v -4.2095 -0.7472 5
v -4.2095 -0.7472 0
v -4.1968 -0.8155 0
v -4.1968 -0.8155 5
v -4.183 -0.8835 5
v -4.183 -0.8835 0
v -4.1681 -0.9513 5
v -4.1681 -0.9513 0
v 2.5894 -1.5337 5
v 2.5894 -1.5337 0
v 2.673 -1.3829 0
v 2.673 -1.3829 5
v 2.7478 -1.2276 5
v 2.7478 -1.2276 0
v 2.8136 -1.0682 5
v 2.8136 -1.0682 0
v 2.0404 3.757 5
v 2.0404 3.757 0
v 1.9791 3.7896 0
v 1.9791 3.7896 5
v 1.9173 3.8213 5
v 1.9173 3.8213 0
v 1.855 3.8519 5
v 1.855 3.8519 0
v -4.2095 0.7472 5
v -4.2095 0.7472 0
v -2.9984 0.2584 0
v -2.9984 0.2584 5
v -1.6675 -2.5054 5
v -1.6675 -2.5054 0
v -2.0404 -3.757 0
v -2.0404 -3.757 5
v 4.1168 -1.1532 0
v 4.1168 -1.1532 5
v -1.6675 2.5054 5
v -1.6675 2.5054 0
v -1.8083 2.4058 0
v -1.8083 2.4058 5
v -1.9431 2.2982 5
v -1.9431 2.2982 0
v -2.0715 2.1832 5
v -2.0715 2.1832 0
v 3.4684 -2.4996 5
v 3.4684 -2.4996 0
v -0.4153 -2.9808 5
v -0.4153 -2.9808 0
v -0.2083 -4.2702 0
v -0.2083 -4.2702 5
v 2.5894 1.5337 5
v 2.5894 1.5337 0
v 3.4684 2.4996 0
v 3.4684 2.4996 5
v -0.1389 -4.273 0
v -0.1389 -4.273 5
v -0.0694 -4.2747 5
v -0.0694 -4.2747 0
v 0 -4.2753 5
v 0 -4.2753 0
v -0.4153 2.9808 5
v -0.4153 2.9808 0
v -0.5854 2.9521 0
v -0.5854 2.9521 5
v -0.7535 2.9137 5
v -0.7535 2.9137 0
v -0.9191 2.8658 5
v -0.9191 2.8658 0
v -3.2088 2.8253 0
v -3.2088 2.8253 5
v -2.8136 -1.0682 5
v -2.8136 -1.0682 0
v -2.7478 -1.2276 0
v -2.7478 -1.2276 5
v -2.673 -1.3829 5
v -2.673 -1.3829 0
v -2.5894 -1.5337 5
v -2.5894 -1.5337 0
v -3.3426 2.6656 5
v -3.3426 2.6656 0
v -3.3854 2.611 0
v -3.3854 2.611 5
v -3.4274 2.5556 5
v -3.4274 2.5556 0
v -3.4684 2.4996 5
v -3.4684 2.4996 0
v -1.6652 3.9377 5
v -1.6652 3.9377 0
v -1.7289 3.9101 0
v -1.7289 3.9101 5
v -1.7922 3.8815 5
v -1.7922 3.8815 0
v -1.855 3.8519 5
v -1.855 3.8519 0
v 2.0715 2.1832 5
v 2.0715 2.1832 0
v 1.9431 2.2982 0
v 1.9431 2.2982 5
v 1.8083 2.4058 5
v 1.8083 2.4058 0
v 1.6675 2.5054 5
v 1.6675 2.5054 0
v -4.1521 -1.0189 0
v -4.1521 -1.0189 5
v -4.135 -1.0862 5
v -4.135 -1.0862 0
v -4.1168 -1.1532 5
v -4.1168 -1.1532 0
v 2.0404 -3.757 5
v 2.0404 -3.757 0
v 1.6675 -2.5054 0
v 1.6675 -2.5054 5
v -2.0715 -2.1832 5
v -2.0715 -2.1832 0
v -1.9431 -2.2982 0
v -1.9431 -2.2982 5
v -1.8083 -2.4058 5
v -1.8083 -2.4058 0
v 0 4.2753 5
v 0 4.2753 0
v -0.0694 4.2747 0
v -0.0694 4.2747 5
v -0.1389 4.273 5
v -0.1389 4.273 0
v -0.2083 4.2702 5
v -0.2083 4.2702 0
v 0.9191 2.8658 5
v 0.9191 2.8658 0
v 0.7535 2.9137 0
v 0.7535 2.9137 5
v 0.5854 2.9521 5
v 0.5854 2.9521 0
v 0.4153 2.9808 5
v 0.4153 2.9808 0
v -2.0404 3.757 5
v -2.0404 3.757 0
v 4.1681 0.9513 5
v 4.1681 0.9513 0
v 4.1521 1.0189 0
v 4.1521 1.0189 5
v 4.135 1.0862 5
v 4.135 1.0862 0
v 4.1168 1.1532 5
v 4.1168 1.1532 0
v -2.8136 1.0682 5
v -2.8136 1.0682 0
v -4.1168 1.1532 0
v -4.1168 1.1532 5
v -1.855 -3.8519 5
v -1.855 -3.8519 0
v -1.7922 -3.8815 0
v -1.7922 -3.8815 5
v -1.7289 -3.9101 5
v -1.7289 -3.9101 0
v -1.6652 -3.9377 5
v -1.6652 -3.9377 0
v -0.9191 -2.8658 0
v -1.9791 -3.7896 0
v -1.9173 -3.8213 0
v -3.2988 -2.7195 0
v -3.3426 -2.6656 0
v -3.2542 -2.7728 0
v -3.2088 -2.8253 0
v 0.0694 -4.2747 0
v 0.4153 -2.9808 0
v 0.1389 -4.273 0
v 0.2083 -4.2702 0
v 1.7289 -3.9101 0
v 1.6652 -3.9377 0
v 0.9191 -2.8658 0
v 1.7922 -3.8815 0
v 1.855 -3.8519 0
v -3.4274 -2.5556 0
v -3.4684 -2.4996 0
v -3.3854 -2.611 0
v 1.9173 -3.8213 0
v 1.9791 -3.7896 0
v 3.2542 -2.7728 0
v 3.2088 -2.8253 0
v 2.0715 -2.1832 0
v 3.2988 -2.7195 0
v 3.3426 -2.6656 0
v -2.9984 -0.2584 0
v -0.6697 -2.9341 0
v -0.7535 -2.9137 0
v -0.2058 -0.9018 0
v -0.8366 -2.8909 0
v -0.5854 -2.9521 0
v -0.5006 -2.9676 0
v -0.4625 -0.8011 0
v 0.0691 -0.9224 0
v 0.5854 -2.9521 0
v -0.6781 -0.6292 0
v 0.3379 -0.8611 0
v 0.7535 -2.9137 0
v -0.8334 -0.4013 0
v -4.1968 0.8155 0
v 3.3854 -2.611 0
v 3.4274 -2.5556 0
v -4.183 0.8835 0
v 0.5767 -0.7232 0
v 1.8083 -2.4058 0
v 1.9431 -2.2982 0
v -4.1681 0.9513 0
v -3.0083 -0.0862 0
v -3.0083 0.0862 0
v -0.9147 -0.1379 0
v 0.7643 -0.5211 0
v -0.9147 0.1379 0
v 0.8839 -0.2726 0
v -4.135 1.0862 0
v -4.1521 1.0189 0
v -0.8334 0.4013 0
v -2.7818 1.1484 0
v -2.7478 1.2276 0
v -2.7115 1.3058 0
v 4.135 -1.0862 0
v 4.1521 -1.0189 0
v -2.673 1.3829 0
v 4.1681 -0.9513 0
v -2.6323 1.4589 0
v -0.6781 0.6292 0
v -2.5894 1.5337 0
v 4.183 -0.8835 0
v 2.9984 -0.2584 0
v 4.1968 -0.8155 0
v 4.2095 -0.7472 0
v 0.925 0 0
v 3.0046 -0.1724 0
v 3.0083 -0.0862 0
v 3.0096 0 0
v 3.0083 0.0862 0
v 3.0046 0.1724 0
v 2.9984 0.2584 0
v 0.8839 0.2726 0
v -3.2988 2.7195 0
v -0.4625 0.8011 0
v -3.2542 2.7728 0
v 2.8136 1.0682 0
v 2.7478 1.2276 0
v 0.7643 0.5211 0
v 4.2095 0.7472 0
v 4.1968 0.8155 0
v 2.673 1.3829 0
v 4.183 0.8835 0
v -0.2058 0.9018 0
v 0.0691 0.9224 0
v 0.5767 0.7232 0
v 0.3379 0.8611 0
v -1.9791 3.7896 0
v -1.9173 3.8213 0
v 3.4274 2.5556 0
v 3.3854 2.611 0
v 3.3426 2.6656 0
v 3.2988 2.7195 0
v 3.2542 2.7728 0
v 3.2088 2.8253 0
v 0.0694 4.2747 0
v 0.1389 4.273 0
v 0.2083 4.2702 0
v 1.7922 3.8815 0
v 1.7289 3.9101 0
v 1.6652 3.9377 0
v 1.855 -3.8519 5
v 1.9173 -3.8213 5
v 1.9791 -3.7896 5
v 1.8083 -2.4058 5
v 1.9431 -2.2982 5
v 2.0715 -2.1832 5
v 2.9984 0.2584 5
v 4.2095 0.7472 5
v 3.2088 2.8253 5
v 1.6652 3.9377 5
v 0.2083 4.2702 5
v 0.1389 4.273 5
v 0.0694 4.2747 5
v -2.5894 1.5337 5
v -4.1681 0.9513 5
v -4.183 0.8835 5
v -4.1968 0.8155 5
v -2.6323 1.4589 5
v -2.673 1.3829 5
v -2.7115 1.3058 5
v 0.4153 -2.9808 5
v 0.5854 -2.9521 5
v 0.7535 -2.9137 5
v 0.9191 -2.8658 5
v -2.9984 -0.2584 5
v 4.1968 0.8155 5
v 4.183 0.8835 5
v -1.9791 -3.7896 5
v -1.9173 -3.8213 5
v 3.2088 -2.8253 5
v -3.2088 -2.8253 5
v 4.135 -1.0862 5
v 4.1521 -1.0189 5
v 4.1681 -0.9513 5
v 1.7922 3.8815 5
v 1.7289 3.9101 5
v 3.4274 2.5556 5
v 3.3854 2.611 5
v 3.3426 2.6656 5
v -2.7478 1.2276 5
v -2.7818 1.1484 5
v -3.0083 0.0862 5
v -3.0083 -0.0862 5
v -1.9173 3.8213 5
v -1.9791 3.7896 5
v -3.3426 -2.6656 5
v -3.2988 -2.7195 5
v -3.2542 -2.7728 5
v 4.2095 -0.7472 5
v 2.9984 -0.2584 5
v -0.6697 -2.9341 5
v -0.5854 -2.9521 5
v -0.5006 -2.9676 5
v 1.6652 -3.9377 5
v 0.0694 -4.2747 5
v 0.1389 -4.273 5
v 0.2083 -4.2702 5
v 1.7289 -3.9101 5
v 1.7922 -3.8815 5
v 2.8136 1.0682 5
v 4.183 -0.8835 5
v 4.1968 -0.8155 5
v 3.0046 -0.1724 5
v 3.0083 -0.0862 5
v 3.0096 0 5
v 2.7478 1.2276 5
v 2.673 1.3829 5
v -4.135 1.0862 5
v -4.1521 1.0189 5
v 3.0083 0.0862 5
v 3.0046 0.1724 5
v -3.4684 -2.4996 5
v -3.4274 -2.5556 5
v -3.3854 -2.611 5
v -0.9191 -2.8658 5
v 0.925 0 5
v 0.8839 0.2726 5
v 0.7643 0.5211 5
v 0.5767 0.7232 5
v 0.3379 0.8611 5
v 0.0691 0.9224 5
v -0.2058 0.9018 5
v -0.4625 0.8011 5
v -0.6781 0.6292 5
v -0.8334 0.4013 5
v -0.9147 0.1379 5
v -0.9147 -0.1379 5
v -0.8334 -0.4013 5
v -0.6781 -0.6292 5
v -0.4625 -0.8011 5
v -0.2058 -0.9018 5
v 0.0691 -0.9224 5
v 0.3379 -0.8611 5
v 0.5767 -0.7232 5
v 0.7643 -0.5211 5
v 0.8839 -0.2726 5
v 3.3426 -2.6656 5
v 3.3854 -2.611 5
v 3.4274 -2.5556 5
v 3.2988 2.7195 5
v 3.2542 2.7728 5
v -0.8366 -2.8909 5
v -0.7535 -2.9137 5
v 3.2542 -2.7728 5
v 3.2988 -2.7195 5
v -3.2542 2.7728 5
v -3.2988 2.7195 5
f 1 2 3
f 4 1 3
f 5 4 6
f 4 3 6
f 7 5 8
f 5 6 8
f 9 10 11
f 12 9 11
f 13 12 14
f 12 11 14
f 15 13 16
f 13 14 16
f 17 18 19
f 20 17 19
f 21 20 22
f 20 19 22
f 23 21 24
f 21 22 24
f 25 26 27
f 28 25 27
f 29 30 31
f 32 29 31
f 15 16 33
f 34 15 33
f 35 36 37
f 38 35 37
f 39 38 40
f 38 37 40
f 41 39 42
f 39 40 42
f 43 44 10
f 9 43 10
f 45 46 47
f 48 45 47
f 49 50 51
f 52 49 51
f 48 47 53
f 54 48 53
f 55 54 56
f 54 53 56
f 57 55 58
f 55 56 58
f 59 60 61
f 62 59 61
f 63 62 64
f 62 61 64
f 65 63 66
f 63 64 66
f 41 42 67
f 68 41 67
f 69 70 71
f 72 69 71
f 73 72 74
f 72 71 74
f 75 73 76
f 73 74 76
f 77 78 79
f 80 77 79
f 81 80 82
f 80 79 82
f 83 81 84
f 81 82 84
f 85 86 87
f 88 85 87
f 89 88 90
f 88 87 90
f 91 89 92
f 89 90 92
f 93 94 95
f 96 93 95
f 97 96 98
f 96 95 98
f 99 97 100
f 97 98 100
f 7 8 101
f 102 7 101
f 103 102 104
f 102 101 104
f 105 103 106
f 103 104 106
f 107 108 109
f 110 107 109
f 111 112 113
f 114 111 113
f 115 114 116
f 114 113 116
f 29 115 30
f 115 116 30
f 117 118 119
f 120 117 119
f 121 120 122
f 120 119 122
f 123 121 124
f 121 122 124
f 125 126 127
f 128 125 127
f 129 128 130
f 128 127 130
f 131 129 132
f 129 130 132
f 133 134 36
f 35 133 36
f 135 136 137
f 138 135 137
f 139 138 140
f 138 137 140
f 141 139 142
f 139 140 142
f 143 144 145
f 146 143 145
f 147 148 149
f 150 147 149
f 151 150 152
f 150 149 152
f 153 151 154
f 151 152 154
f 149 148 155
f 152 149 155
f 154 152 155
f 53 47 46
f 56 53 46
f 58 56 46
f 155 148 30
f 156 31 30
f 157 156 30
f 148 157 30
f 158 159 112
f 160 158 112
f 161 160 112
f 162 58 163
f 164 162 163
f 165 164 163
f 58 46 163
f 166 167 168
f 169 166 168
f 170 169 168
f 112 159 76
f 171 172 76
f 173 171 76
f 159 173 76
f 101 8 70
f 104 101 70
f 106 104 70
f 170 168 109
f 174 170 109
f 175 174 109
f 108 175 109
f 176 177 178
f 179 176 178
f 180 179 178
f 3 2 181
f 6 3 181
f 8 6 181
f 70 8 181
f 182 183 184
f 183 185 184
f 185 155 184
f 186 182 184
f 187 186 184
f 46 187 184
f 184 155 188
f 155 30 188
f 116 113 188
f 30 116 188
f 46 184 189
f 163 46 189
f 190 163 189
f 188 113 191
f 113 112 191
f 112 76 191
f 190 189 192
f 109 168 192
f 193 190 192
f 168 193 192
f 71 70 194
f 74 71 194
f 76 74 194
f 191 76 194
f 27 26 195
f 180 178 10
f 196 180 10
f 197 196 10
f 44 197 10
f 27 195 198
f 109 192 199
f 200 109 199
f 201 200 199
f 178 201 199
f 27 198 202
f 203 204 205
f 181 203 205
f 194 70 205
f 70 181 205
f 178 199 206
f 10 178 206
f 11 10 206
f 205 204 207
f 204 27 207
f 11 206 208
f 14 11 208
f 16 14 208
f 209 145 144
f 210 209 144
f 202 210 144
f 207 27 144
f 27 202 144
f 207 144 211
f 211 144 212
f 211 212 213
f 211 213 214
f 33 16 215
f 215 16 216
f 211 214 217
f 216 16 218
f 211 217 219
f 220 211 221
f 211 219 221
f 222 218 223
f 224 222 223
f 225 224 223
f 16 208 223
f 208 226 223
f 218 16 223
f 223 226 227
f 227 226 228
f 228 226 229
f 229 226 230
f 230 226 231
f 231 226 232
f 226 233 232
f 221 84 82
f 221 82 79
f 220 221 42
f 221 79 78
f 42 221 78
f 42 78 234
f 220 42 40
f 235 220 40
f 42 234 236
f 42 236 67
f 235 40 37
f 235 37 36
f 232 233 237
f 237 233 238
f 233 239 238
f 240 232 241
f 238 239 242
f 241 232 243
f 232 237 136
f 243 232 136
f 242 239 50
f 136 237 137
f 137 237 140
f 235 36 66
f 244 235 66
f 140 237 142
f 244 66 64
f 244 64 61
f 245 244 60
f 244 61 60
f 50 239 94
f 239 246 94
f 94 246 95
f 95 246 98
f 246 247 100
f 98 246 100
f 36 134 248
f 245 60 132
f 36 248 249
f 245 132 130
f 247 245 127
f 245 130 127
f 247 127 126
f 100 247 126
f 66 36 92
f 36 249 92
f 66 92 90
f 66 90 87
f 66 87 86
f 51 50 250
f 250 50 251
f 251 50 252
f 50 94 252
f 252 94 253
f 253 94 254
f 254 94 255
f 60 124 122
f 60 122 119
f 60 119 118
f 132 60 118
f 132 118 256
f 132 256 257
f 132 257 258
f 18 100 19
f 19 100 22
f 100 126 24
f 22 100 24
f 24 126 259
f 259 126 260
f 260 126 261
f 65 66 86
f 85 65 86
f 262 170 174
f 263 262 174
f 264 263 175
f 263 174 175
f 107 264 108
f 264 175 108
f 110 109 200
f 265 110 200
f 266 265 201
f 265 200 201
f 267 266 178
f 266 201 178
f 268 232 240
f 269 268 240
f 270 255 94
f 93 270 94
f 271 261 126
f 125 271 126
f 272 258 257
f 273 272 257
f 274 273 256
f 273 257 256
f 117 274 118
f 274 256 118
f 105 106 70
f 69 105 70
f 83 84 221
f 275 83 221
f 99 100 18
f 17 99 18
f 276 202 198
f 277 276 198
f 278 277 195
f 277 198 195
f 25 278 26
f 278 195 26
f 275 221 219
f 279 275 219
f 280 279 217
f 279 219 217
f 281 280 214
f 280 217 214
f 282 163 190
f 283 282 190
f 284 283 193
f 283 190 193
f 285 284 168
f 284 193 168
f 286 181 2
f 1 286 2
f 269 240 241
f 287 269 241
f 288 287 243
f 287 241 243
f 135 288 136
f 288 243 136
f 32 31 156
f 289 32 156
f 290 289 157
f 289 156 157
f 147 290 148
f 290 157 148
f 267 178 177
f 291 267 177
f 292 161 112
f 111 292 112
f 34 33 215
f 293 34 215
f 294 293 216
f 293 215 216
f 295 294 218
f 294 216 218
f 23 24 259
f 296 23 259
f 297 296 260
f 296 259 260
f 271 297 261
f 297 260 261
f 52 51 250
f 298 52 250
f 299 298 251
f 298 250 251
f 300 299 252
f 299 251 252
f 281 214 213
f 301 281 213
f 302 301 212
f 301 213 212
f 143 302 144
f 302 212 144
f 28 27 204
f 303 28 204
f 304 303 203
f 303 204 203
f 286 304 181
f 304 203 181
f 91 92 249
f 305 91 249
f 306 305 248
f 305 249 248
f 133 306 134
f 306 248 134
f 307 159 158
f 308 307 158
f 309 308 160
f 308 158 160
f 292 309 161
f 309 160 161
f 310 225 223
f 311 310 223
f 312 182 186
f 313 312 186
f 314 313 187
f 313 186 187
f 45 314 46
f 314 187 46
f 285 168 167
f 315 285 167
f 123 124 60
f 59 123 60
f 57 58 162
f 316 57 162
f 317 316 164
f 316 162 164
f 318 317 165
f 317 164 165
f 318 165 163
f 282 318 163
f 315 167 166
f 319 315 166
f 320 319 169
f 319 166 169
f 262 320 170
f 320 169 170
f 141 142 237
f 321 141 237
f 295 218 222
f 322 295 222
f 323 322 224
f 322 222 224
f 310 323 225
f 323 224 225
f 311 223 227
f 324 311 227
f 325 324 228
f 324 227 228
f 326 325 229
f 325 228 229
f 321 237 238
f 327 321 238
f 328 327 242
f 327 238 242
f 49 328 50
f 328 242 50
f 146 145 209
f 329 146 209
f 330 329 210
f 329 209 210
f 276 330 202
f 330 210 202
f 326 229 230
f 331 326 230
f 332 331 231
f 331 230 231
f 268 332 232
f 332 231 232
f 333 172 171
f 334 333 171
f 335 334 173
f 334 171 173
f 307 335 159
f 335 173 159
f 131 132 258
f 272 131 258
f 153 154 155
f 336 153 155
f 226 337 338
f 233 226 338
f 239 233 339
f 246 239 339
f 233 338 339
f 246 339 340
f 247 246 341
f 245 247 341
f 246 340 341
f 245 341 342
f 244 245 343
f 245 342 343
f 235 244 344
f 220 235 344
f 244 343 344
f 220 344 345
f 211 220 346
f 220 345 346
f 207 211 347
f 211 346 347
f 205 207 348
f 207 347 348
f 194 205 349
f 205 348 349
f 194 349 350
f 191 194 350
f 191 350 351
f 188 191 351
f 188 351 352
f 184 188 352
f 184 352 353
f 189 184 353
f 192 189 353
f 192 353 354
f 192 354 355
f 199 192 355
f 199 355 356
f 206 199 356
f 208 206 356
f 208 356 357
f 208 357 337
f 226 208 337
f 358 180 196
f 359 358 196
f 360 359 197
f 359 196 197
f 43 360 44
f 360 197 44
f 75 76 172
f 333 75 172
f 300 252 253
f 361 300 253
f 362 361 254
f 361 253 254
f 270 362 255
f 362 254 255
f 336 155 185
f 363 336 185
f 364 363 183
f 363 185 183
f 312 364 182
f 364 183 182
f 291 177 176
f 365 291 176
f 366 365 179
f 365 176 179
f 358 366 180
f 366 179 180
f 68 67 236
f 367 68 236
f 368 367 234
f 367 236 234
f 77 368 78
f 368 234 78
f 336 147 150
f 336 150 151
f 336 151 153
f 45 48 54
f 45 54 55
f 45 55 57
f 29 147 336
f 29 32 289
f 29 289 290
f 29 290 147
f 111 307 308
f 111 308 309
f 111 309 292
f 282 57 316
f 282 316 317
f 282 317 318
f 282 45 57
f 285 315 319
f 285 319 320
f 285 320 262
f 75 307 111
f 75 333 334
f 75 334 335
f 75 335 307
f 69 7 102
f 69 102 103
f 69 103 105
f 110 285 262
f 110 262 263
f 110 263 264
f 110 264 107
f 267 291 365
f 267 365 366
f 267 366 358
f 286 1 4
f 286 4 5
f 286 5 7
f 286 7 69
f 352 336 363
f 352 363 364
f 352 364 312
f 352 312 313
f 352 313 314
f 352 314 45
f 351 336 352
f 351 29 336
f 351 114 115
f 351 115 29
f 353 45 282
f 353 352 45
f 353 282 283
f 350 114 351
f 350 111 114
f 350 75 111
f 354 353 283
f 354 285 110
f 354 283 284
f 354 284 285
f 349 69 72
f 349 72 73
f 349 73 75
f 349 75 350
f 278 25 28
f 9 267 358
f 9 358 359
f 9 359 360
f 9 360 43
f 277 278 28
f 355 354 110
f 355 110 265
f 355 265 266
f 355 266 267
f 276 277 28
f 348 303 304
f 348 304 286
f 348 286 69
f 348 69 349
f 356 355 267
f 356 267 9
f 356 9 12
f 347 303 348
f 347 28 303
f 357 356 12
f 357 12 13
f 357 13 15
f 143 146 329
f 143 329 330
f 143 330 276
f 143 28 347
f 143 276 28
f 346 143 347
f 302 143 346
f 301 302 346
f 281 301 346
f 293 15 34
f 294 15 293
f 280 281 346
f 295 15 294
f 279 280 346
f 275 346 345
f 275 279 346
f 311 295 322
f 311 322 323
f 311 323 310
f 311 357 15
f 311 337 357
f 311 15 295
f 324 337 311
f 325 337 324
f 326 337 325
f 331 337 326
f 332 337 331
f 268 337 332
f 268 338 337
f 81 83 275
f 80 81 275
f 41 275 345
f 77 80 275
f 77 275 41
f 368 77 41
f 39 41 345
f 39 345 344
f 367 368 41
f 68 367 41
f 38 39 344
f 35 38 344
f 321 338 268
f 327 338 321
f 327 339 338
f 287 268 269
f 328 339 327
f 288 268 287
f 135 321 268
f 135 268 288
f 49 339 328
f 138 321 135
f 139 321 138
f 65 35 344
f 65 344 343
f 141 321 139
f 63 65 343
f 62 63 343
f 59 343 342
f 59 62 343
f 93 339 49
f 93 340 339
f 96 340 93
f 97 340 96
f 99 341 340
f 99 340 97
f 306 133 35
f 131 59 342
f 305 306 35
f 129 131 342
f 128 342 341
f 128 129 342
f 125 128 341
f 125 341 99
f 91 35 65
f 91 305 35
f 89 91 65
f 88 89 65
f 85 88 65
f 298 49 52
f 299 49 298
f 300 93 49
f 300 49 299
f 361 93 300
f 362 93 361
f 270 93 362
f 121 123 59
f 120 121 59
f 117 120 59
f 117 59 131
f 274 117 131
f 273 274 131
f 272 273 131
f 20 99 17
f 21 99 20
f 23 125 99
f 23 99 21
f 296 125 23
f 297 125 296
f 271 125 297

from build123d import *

# Parameters (mm, degrees)
F3_DEPTH = 5
F4_DEPTH = 5
F5_COUNT = 14
F6_R     = 0.925
F7_DEPTH = 5.001


with BuildPart() as f3:
    # F1 (on Top) → F3 (new body)
    with BuildSketch(Plane.XY):
        with BuildLine():
            ThreePointArc((-0.4153368417, 2.9807568553), (-1.9757830613, -2.2701756357), (3.0095541401, 0))
            ThreePointArc((3.0095541401, 0), (2.2701756357, 1.9757830613), (0.4153368417, 2.9807568553))
            ThreePointArc((0.4153368417, 2.9807568553), (0.2081669857, 3.0023461873), (0, 3.0095541401))
            ThreePointArc((0, 3.0095541401), (-0.2081669857, 3.0023461873), (-0.4153368417, 2.9807568553))
        make_face()
    extrude(amount=F3_DEPTH)

    # F1 (on Top) → F4 (join)
    with BuildSketch(Plane.XY):
        with BuildLine():
            ThreePointArc((0, 3.0095541401), (0.2081669857, 3.0023461873), (0.4153368417, 2.9807568553))
            Line((0.4153368417, 2.9807568553), (0.208250893, 4.2702265482))
            ThreePointArc((0.208250893, 4.2702265482), (0.1041563607, 4.2740325993), (0, 4.2753015341))
            ThreePointArc((0, 4.2753015341), (-0.1041563607, 4.2740325993), (-0.208250893, 4.2702265482))
            Line((-0.208250893, 4.2702265482), (-0.4153368417, 2.9807568553))
            ThreePointArc((-0.4153368417, 2.9807568553), (-0.2081669857, 3.0023461873), (0, 3.0095541401))
        make_face()
    extrude(amount=F4_DEPTH)

    # F5: F3 ×14 about axis
    f5_axis = Axis((0, 0, 3.5011740401), (0, 0, -1))


with BuildPart() as f3_1:
    add(f3.part)
    for i in range(1, F5_COUNT):
        add(f3.part.rotate(f5_axis, i * 360 / F5_COUNT))

    # F6 (on face) → F7 (cut, through all)
    with BuildSketch(Plane.XY.offset(5)):
        Circle(F6_R)
    extrude(amount=-F7_DEPTH, mode=Mode.SUBTRACT)


solid = f3_1.part
